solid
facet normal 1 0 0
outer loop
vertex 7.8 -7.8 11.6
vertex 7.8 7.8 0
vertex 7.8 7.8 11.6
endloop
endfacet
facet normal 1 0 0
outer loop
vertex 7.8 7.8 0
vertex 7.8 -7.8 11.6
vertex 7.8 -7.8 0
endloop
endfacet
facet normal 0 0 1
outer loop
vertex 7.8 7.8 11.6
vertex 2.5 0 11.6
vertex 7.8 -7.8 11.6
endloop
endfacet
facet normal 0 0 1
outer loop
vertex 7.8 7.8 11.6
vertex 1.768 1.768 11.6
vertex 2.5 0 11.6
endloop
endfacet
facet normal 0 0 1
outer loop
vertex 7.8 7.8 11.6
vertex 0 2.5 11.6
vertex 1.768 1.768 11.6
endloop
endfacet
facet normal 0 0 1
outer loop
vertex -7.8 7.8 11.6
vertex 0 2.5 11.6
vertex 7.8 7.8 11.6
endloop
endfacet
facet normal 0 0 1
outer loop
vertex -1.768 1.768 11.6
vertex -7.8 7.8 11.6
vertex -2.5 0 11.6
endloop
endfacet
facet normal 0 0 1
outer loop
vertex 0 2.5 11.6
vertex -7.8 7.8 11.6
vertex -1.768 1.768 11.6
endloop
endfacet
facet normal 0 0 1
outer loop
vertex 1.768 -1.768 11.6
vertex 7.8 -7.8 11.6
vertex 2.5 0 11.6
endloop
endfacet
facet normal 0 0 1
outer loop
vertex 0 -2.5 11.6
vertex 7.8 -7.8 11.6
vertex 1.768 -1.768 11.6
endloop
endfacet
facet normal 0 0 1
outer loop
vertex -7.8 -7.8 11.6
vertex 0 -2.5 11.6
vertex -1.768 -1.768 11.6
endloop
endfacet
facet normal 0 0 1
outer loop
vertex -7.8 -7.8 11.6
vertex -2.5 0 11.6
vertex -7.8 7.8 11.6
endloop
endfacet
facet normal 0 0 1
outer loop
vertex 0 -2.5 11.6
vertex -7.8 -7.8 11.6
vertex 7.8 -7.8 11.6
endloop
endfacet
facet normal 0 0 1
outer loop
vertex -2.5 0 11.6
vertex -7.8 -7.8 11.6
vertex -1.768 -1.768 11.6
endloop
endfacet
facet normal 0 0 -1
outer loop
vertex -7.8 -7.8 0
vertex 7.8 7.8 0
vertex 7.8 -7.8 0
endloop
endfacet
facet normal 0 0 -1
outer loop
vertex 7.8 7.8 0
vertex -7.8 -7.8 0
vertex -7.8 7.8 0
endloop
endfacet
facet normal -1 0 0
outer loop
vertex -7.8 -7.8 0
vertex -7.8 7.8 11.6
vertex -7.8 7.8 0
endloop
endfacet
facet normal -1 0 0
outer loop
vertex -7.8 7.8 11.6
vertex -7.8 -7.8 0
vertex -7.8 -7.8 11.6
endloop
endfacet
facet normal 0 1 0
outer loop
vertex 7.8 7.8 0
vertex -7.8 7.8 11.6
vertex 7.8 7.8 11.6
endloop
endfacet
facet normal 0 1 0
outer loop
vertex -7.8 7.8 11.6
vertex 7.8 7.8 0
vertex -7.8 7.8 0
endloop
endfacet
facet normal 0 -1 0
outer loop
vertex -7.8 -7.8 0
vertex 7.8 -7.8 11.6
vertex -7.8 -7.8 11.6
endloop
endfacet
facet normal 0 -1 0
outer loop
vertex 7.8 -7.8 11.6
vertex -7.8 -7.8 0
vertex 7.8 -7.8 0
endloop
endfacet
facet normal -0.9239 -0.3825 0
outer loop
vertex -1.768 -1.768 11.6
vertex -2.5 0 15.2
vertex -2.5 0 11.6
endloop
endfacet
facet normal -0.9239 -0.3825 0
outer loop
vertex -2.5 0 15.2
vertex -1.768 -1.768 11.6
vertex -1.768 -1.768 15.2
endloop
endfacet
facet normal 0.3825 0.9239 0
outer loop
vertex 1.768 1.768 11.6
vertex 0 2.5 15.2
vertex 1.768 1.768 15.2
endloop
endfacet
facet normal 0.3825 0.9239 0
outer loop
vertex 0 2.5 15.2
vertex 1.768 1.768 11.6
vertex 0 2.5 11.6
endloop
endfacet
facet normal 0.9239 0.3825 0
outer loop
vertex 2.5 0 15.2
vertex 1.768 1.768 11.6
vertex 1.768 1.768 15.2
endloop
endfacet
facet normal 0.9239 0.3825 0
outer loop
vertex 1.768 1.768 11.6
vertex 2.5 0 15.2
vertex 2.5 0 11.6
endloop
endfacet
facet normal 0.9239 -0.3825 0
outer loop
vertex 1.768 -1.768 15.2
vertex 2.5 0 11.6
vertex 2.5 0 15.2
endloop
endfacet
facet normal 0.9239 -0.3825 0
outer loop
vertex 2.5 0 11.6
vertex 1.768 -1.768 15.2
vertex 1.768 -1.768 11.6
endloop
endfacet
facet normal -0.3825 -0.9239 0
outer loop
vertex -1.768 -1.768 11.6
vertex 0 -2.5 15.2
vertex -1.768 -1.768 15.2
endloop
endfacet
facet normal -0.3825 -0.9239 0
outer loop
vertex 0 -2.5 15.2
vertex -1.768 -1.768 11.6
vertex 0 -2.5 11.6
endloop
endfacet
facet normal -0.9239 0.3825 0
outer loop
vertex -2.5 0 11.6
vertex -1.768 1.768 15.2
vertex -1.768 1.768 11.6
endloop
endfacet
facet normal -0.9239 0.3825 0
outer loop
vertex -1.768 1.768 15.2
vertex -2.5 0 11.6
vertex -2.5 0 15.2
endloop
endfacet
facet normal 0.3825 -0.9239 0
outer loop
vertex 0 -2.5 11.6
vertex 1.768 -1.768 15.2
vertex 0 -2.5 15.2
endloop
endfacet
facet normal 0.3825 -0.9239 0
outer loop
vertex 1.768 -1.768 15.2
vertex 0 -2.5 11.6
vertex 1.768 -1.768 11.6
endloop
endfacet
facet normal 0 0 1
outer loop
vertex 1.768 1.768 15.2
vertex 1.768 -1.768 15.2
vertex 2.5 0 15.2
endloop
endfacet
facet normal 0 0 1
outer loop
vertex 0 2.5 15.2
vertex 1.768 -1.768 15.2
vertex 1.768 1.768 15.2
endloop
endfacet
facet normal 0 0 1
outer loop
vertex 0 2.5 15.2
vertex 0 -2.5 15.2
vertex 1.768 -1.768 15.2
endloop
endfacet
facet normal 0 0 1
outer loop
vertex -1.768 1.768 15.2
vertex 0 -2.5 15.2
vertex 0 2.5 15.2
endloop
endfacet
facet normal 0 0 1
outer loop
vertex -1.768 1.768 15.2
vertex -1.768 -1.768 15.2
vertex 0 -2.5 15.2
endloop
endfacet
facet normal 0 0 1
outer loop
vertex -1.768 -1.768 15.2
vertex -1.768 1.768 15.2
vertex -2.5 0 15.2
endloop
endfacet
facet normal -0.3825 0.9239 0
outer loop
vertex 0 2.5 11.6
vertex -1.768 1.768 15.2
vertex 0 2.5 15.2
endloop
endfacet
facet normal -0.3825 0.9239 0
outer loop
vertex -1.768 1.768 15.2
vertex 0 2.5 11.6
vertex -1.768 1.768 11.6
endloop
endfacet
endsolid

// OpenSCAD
//
// Cherry MX keyswitch simple model
//

module mx() {
     mx_wid = 15.6;
     mx_hgt = 11.6;
     mx_shaft_len = 3.6;
     mx_shaft_dia = 5;
     mx_cutout = 14;

     translate( [-mx_wid/2, -mx_wid/2, 0])
	  cube( [mx_wid, mx_wid, mx_hgt]);
     translate( [0, 0, mx_hgt])
	  cylinder( d=mx_shaft_dia, h=mx_shaft_len);
}

module mx_cap() {
     cap_w1 = 18.1;
     cap_w2 = 12.37;
     
}

mx();
